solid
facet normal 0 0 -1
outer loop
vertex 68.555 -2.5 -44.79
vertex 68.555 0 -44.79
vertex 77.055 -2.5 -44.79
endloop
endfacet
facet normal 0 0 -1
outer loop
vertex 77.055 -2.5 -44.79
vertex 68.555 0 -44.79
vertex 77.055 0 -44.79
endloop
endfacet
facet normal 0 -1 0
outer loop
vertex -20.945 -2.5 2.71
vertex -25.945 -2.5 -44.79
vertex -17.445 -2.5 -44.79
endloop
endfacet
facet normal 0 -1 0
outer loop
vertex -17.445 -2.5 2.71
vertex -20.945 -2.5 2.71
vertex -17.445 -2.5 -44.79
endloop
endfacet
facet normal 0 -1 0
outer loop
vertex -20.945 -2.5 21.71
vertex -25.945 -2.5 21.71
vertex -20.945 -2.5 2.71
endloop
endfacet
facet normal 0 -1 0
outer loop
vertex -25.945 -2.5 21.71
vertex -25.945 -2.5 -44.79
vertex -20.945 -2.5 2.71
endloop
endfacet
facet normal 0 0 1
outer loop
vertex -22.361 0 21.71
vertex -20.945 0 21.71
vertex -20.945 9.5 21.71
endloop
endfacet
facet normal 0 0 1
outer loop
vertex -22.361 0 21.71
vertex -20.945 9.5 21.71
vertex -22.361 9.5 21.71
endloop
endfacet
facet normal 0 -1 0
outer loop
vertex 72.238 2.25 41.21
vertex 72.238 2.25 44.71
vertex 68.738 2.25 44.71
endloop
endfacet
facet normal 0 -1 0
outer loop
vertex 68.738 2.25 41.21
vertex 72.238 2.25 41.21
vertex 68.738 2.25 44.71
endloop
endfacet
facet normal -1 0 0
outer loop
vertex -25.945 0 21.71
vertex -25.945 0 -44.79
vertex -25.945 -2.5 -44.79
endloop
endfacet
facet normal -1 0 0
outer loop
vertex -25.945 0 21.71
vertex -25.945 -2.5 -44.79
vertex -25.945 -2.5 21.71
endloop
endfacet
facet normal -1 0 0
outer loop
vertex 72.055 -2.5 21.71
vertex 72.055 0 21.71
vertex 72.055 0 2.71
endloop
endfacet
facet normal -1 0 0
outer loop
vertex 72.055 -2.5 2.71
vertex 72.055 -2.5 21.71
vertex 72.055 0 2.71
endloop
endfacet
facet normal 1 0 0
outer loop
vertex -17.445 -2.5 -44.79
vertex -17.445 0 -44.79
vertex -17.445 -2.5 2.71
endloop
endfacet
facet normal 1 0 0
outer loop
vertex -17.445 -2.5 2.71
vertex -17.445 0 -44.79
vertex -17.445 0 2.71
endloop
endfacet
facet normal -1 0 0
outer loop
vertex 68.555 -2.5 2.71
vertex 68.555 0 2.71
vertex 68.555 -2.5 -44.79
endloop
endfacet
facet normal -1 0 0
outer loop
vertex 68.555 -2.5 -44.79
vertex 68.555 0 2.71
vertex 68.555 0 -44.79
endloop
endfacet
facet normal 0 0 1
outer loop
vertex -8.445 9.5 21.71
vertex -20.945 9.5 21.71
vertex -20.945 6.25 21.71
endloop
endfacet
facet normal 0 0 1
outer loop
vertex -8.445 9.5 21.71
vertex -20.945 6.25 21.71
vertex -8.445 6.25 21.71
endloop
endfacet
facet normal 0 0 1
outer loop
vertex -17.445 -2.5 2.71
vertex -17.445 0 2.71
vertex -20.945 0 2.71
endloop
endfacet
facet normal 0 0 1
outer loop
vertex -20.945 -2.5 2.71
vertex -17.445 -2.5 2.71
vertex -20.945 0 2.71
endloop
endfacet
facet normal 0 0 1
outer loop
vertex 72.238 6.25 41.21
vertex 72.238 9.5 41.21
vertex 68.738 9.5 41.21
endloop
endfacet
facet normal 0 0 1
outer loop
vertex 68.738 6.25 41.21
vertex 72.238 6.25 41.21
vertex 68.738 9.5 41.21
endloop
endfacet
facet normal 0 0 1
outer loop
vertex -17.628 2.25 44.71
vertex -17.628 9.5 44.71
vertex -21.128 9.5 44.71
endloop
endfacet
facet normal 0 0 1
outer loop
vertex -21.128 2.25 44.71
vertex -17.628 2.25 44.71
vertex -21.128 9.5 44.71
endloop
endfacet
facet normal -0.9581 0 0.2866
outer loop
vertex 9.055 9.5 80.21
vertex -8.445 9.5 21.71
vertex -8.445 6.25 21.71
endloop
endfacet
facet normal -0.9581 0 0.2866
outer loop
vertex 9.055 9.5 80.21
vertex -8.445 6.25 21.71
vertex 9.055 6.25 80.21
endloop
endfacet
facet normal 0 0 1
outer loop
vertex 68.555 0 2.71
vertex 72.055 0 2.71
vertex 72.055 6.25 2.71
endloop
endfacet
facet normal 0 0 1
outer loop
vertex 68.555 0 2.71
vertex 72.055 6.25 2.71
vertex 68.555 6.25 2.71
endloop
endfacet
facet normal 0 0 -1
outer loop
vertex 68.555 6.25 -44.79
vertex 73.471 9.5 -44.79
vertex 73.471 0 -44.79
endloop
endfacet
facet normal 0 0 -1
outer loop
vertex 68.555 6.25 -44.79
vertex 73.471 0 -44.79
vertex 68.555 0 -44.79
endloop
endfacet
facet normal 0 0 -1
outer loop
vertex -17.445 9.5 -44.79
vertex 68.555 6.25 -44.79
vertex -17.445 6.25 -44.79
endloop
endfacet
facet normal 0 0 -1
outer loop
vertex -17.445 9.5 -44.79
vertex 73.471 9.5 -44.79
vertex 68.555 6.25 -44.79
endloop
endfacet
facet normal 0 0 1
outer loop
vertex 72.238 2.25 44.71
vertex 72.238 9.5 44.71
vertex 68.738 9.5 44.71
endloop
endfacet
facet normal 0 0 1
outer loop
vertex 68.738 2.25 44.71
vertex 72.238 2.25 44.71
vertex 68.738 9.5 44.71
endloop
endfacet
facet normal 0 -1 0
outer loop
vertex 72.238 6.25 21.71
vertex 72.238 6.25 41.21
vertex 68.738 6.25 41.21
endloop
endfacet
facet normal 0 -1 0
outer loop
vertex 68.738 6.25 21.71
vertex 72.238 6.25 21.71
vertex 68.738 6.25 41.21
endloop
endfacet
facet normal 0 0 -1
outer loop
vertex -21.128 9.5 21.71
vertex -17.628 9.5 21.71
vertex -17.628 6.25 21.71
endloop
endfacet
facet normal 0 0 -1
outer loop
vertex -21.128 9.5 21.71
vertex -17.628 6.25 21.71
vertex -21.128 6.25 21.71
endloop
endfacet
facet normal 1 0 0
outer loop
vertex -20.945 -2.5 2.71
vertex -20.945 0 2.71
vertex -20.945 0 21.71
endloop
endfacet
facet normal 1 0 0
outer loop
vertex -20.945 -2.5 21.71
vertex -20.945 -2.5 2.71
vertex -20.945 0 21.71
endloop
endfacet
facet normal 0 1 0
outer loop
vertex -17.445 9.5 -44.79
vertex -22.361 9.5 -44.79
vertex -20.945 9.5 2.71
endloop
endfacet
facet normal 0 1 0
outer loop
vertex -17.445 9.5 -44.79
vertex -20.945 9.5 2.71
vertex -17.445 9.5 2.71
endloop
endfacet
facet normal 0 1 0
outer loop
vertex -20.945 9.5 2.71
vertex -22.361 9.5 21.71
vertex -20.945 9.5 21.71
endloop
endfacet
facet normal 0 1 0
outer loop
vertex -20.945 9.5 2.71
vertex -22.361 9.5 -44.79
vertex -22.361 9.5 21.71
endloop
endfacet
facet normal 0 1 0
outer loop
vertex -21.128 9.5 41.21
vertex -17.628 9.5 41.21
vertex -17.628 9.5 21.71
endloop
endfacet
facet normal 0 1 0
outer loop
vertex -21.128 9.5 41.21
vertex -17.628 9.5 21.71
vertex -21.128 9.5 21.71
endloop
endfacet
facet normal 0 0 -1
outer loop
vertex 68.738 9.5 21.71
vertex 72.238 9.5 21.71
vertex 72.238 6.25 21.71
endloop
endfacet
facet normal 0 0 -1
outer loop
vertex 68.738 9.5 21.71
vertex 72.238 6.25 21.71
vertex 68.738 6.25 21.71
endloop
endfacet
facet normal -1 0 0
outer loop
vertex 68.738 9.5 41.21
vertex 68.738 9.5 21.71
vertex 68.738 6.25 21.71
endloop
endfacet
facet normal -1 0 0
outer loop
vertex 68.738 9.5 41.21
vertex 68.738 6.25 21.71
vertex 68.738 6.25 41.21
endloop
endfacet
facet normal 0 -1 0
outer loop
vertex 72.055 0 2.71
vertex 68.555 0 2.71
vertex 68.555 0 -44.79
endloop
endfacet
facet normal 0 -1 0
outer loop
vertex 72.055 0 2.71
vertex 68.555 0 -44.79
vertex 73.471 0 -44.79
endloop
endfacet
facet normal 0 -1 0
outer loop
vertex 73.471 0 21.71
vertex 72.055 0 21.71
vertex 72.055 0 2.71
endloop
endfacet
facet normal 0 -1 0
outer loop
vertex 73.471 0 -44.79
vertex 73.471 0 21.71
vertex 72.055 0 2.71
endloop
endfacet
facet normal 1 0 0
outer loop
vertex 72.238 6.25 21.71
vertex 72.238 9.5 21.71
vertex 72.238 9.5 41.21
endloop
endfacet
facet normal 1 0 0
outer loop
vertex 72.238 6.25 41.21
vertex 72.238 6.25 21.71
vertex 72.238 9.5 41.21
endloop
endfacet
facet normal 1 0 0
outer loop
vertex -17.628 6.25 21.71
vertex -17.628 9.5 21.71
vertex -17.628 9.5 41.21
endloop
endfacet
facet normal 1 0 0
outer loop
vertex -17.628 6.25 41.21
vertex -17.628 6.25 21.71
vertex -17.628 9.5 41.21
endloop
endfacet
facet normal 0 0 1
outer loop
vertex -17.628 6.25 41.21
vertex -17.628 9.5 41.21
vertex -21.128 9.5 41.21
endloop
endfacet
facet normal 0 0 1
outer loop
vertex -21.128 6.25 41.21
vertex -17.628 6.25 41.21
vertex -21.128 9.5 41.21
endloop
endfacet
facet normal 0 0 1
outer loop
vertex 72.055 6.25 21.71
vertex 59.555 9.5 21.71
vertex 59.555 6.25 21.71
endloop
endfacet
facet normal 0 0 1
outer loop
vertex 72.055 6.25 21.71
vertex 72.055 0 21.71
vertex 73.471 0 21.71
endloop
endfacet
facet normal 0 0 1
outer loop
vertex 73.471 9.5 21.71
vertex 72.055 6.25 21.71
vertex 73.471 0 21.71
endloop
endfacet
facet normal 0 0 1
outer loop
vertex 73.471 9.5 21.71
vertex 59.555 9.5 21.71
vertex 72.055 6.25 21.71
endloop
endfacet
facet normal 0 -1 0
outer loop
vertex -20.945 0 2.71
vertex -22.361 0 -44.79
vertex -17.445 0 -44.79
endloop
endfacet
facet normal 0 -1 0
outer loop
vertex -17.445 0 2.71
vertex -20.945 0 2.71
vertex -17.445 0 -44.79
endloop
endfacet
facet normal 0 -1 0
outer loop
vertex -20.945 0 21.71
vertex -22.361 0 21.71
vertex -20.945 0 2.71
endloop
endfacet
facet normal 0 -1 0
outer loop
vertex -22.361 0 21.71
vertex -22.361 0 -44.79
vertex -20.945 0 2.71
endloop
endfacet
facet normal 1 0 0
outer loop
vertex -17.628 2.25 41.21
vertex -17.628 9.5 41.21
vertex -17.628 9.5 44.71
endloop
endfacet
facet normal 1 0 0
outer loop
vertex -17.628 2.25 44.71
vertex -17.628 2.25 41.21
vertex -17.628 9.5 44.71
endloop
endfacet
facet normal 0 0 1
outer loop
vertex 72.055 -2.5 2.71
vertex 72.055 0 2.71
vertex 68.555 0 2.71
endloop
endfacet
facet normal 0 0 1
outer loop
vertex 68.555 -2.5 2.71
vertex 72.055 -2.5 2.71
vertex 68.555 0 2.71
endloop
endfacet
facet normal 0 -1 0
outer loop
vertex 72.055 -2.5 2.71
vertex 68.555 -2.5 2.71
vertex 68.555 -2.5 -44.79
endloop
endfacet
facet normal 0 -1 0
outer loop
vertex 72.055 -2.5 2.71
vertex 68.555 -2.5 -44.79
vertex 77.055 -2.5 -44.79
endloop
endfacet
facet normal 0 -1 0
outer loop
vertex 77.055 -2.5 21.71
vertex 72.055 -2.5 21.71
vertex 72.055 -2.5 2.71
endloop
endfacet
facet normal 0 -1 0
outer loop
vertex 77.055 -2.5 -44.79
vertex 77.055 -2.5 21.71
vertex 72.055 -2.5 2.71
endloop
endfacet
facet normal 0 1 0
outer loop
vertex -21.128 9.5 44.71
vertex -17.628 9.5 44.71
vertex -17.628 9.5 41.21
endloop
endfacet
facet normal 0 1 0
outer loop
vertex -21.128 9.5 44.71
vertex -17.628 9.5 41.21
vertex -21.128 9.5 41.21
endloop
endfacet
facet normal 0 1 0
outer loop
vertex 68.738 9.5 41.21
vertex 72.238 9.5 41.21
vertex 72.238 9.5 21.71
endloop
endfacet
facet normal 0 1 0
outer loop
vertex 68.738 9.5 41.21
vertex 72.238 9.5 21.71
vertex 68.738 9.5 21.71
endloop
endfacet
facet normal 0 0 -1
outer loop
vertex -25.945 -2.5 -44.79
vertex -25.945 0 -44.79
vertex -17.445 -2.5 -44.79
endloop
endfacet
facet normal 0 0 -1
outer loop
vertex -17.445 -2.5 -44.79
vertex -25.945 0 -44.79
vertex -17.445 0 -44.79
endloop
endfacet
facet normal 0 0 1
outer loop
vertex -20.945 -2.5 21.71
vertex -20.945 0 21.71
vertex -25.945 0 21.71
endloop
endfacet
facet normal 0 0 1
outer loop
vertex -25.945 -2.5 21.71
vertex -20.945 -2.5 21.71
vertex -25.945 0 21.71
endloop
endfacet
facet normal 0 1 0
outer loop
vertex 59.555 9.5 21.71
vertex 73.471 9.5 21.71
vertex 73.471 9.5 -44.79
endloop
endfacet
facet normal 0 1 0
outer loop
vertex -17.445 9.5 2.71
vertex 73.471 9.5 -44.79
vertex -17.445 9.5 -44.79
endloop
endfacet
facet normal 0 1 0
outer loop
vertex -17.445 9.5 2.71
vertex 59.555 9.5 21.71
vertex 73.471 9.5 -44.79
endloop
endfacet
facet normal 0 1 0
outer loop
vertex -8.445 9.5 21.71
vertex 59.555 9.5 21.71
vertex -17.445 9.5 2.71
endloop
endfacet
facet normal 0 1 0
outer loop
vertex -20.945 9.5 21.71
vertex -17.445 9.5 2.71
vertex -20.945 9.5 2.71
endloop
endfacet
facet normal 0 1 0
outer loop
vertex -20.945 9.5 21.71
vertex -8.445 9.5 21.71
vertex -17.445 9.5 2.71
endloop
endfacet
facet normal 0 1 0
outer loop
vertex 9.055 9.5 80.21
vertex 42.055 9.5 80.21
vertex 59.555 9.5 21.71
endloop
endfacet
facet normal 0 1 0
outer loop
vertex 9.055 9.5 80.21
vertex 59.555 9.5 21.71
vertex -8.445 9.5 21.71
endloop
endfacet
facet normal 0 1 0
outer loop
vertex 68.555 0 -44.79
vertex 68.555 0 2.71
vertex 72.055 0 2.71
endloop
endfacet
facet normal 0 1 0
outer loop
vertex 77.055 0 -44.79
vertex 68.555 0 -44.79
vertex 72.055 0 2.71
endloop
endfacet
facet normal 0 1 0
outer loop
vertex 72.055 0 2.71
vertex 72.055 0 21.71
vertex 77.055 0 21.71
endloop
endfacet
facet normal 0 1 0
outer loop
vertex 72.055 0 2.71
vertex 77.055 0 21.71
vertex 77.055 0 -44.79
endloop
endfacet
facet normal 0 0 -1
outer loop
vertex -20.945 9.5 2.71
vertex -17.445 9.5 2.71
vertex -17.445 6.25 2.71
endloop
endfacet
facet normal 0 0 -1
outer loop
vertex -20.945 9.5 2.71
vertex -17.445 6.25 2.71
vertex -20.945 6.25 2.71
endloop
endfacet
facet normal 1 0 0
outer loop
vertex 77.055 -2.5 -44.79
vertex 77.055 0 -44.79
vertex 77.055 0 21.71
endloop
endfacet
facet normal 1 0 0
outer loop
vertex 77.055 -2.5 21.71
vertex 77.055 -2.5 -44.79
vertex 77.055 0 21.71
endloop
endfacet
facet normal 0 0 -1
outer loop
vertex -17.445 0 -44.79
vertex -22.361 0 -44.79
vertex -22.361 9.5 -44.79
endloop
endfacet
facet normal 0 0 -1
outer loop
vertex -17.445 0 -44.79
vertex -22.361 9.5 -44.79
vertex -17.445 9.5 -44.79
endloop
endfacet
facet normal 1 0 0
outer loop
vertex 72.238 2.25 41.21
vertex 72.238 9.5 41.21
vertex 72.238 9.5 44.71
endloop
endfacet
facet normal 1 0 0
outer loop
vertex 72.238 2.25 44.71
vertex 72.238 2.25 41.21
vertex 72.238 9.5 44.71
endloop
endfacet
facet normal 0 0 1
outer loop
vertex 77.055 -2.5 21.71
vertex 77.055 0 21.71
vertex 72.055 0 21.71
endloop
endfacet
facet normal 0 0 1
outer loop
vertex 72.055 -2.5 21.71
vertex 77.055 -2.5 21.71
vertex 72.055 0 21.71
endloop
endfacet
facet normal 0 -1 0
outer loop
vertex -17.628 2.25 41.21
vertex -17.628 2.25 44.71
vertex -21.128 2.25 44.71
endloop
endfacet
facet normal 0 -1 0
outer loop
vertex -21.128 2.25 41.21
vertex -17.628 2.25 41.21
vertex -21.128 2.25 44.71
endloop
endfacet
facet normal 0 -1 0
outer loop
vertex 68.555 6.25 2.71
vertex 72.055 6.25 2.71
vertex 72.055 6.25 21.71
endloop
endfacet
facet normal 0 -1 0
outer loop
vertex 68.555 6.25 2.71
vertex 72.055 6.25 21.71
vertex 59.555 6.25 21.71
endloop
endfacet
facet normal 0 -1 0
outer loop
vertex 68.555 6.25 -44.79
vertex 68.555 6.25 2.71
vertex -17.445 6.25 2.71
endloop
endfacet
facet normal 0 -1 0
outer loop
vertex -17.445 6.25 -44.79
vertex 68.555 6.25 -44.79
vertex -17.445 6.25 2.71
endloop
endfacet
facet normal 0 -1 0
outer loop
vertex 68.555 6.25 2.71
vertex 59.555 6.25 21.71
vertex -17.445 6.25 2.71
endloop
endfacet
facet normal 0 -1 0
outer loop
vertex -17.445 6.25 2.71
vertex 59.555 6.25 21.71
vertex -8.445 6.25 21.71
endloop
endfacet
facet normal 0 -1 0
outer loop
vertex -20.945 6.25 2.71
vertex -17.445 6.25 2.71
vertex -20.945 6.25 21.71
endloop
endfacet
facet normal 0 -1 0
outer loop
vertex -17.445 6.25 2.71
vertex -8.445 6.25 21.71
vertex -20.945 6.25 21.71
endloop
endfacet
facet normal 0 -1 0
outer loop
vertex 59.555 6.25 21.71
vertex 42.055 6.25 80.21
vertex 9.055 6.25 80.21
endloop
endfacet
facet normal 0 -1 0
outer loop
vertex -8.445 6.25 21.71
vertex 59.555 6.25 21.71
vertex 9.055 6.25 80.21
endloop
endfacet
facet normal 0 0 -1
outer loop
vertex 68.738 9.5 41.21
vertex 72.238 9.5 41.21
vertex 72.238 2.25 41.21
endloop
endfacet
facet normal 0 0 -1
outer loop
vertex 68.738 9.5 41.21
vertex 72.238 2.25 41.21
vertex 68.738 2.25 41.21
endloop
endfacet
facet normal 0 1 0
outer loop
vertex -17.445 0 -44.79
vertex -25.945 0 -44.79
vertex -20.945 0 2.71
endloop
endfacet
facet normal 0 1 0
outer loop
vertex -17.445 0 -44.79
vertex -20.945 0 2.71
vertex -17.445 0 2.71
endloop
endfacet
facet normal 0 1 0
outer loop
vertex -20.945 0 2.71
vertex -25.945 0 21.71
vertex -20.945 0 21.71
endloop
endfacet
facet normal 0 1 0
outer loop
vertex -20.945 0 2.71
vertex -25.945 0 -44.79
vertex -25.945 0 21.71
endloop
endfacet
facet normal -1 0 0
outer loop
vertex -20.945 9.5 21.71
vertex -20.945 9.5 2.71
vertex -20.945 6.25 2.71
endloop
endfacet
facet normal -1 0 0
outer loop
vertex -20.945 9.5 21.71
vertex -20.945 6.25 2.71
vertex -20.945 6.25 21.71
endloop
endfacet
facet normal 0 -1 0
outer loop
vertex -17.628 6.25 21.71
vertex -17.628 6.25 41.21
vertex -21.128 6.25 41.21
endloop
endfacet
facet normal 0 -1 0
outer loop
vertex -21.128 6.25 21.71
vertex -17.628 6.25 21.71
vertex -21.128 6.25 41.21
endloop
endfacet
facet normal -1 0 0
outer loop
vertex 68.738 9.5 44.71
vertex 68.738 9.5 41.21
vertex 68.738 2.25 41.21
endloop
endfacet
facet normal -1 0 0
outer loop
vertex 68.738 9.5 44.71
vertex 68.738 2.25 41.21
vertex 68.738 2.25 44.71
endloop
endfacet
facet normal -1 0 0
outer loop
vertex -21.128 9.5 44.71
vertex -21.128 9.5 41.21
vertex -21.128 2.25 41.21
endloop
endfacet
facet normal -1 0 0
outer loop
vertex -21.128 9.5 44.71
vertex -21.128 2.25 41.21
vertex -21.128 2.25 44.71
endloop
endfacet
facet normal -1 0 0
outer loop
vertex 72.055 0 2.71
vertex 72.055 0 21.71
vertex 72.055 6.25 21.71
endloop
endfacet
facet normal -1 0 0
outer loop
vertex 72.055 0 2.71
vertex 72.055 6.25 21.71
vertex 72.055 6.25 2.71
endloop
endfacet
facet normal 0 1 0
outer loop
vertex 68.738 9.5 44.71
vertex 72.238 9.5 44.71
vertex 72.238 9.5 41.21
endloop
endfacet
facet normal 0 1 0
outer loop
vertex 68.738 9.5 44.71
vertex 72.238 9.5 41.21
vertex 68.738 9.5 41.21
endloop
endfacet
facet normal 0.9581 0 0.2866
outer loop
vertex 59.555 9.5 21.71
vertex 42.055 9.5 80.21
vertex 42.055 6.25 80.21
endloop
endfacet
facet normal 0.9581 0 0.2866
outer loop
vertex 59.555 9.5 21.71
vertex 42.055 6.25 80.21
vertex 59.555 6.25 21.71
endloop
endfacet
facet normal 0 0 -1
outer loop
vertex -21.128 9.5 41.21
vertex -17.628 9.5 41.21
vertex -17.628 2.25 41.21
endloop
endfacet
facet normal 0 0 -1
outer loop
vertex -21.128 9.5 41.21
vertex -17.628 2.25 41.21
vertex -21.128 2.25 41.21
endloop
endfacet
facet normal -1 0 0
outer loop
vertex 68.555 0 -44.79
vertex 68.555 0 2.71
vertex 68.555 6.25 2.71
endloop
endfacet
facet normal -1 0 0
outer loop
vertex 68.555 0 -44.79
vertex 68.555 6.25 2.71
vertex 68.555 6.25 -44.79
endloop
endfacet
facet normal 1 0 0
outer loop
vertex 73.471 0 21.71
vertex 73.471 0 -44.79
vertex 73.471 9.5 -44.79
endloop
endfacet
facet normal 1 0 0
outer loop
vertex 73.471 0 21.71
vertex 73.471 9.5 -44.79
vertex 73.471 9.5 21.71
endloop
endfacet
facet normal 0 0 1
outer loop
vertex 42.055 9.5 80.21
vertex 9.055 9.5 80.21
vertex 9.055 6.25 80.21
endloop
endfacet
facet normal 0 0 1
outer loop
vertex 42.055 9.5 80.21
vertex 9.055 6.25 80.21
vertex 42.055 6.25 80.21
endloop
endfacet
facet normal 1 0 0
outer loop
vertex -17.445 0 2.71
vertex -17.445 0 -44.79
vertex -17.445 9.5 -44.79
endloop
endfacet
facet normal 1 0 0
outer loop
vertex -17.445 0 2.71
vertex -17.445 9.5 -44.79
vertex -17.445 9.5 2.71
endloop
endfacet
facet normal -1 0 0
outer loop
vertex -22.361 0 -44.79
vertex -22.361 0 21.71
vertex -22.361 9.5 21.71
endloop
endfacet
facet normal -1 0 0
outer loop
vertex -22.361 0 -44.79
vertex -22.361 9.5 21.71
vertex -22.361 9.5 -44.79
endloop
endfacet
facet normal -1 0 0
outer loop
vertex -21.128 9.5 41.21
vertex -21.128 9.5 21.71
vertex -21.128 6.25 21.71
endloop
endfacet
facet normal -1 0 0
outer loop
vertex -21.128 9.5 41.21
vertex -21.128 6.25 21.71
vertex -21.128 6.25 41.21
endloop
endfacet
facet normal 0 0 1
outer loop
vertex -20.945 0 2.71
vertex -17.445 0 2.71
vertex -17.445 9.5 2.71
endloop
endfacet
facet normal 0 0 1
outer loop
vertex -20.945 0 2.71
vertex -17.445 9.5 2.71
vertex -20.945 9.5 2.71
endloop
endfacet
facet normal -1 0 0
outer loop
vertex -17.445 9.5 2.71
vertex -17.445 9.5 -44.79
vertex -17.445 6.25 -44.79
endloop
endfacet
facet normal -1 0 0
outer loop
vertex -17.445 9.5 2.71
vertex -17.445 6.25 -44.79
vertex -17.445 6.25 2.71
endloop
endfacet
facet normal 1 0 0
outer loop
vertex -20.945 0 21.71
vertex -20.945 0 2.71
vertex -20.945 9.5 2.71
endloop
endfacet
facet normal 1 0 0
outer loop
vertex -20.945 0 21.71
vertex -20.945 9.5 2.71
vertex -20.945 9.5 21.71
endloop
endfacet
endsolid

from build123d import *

# Parameters (mm, degrees)
F0_W     = 3.5839973688
F0_H     = 66.5
F1_DEPTH = 2.5
F2_DEPTH = 9.5
F4_DEPTH = 3.25
F5_W     = 3.5
F5_H     = 19.5
F6_DEPTH = 3.25
F5_H_2   = 3.5
F7_DEPTH = 7.25


# Not quite as in the source:
# - a feature names something its author has since deleted; it is built from what else it names


with BuildPart() as f1:
    # F0 (on Front) → F1 (new body)
    with BuildSketch(Plane.XZ):
        with Locations((-24.1530238986, -11.5398805141)):
            Rectangle(F0_W, F0_H)
        Polygon((-20.945022583, 21.7101194859), (-22.3610252142, 21.7101194859), (-22.3610252142, -44.7898805141), (-17.445022583, -44.7898805141), (-17.445022583, 2.7101194859), (-20.945022583, 2.7101194859), align=None)
    extrude(amount=F1_DEPTH)


with BuildPart() as f1b:
    # F0 (on Front) → F1, piece 2 (new body)
    with BuildSketch(Plane.XZ):
        with Locations((75.2629787326, -11.5398805141)):
            Rectangle(F0_W, F0_H)
        Polygon((68.554977417, 2.7101194859), (68.554977417, -44.7898805141), (73.4709800482, -44.7898805141), (73.4709800482, 21.7101194859), (72.054977417, 21.7101194859), (72.054977417, 2.7101194859), align=None)
    extrude(amount=F1_DEPTH)


with BuildPart() as f2:
    # F0 (on Front) → F2 (new body)
    with BuildSketch(Plane.XZ):
        Polygon((-20.945022583, 21.7101194859), (-22.3610252142, 21.7101194859), (-22.3610252142, -44.7898805141), (-17.445022583, -44.7898805141), (-17.445022583, 2.7101194859), (-20.945022583, 2.7101194859), align=None)
    extrude(amount=-F2_DEPTH)


with BuildPart() as f2b:
    # F0 (on Front) → F2, piece 2 (new body)
    with BuildSketch(Plane.XZ):
        Polygon((68.554977417, 2.7101194859), (68.554977417, -44.7898805141), (73.4709800482, -44.7898805141), (73.4709800482, 21.7101194859), (72.054977417, 21.7101194859), (72.054977417, 2.7101194859), align=None)
    extrude(amount=-F2_DEPTH)

    # F3 (on face) → F4 (join)
    with BuildSketch(Plane(origin=(0, 9.5, 0), x_dir=(-1, 0, 0), z_dir=(0, 1, 0))):
        Polygon((20.945022583, 2.7101194859), (20.945022583, 21.7101194859), (8.4450252142, 21.7101194859), (-25.5549747858, 21.7101194859), (-25.5549747858, -44.7898805141), (17.445022583, -44.7898805141), (17.445022583, 2.7101194859), align=None)
        Polygon((-25.5549747858, 21.7101194859), (8.4450252142, 21.7101194859), (-9.0549747858, 80.2101194859), (-25.5549747858, 80.2101194859), align=None)
        Polygon((-59.5549747858, 21.7101194859), (-25.5549747858, 21.7101194859), (-25.5549747858, 80.2101194859), (-42.0549747858, 80.2101194859), align=None)
        Polygon((-73.4709747858, -44.7898805141), (-25.5549747858, -44.7898805141), (-25.5549747858, 21.7101194859), (-59.5549747858, 21.7101194859), (-73.4709747858, 21.7101194859), align=None)
    extrude(amount=-F4_DEPTH)


with BuildPart() as f6:
    # F5 (on face) → F6 (new body)
    with BuildSketch(Plane(origin=(0, 9.5, 0), x_dir=(-1, 0, 0), z_dir=(0, 1, 0))):
        with Locations((-70.4882739186, 31.4602952302)):
            Rectangle(F5_W, F5_H)
    extrude(amount=-F6_DEPTH)


with BuildPart() as f6b:
    # F5 (on face) → F6, piece 2 (new body)
    with BuildSketch(Plane(origin=(0, 9.5, 0), x_dir=(-1, 0, 0), z_dir=(0, 1, 0))):
        with Locations((19.378324347, 31.4602952302)):
            Rectangle(F5_W, F5_H)
    extrude(amount=-F6_DEPTH)


with BuildPart() as f7:
    # F5 (on face) → F7 (new body)
    with BuildSketch(Plane(origin=(0, 9.5, 0), x_dir=(-1, 0, 0), z_dir=(0, 1, 0))):
        with Locations((-70.4882739186, 42.9602952302)):
            Rectangle(F5_W, F5_H_2)
    extrude(amount=-F7_DEPTH)


with BuildPart() as f7b:
    # F5 (on face) → F7, piece 2 (new body)
    with BuildSketch(Plane(origin=(0, 9.5, 0), x_dir=(-1, 0, 0), z_dir=(0, 1, 0))):
        with Locations((19.378324347, 42.9602952302)):
            Rectangle(F5_W, F5_H_2)
    extrude(amount=-F7_DEPTH)


solid = Compound([f1.part, f1b.part, f2.part, f2b.part, f6.part, f6b.part, f7.part, f7b.part])
